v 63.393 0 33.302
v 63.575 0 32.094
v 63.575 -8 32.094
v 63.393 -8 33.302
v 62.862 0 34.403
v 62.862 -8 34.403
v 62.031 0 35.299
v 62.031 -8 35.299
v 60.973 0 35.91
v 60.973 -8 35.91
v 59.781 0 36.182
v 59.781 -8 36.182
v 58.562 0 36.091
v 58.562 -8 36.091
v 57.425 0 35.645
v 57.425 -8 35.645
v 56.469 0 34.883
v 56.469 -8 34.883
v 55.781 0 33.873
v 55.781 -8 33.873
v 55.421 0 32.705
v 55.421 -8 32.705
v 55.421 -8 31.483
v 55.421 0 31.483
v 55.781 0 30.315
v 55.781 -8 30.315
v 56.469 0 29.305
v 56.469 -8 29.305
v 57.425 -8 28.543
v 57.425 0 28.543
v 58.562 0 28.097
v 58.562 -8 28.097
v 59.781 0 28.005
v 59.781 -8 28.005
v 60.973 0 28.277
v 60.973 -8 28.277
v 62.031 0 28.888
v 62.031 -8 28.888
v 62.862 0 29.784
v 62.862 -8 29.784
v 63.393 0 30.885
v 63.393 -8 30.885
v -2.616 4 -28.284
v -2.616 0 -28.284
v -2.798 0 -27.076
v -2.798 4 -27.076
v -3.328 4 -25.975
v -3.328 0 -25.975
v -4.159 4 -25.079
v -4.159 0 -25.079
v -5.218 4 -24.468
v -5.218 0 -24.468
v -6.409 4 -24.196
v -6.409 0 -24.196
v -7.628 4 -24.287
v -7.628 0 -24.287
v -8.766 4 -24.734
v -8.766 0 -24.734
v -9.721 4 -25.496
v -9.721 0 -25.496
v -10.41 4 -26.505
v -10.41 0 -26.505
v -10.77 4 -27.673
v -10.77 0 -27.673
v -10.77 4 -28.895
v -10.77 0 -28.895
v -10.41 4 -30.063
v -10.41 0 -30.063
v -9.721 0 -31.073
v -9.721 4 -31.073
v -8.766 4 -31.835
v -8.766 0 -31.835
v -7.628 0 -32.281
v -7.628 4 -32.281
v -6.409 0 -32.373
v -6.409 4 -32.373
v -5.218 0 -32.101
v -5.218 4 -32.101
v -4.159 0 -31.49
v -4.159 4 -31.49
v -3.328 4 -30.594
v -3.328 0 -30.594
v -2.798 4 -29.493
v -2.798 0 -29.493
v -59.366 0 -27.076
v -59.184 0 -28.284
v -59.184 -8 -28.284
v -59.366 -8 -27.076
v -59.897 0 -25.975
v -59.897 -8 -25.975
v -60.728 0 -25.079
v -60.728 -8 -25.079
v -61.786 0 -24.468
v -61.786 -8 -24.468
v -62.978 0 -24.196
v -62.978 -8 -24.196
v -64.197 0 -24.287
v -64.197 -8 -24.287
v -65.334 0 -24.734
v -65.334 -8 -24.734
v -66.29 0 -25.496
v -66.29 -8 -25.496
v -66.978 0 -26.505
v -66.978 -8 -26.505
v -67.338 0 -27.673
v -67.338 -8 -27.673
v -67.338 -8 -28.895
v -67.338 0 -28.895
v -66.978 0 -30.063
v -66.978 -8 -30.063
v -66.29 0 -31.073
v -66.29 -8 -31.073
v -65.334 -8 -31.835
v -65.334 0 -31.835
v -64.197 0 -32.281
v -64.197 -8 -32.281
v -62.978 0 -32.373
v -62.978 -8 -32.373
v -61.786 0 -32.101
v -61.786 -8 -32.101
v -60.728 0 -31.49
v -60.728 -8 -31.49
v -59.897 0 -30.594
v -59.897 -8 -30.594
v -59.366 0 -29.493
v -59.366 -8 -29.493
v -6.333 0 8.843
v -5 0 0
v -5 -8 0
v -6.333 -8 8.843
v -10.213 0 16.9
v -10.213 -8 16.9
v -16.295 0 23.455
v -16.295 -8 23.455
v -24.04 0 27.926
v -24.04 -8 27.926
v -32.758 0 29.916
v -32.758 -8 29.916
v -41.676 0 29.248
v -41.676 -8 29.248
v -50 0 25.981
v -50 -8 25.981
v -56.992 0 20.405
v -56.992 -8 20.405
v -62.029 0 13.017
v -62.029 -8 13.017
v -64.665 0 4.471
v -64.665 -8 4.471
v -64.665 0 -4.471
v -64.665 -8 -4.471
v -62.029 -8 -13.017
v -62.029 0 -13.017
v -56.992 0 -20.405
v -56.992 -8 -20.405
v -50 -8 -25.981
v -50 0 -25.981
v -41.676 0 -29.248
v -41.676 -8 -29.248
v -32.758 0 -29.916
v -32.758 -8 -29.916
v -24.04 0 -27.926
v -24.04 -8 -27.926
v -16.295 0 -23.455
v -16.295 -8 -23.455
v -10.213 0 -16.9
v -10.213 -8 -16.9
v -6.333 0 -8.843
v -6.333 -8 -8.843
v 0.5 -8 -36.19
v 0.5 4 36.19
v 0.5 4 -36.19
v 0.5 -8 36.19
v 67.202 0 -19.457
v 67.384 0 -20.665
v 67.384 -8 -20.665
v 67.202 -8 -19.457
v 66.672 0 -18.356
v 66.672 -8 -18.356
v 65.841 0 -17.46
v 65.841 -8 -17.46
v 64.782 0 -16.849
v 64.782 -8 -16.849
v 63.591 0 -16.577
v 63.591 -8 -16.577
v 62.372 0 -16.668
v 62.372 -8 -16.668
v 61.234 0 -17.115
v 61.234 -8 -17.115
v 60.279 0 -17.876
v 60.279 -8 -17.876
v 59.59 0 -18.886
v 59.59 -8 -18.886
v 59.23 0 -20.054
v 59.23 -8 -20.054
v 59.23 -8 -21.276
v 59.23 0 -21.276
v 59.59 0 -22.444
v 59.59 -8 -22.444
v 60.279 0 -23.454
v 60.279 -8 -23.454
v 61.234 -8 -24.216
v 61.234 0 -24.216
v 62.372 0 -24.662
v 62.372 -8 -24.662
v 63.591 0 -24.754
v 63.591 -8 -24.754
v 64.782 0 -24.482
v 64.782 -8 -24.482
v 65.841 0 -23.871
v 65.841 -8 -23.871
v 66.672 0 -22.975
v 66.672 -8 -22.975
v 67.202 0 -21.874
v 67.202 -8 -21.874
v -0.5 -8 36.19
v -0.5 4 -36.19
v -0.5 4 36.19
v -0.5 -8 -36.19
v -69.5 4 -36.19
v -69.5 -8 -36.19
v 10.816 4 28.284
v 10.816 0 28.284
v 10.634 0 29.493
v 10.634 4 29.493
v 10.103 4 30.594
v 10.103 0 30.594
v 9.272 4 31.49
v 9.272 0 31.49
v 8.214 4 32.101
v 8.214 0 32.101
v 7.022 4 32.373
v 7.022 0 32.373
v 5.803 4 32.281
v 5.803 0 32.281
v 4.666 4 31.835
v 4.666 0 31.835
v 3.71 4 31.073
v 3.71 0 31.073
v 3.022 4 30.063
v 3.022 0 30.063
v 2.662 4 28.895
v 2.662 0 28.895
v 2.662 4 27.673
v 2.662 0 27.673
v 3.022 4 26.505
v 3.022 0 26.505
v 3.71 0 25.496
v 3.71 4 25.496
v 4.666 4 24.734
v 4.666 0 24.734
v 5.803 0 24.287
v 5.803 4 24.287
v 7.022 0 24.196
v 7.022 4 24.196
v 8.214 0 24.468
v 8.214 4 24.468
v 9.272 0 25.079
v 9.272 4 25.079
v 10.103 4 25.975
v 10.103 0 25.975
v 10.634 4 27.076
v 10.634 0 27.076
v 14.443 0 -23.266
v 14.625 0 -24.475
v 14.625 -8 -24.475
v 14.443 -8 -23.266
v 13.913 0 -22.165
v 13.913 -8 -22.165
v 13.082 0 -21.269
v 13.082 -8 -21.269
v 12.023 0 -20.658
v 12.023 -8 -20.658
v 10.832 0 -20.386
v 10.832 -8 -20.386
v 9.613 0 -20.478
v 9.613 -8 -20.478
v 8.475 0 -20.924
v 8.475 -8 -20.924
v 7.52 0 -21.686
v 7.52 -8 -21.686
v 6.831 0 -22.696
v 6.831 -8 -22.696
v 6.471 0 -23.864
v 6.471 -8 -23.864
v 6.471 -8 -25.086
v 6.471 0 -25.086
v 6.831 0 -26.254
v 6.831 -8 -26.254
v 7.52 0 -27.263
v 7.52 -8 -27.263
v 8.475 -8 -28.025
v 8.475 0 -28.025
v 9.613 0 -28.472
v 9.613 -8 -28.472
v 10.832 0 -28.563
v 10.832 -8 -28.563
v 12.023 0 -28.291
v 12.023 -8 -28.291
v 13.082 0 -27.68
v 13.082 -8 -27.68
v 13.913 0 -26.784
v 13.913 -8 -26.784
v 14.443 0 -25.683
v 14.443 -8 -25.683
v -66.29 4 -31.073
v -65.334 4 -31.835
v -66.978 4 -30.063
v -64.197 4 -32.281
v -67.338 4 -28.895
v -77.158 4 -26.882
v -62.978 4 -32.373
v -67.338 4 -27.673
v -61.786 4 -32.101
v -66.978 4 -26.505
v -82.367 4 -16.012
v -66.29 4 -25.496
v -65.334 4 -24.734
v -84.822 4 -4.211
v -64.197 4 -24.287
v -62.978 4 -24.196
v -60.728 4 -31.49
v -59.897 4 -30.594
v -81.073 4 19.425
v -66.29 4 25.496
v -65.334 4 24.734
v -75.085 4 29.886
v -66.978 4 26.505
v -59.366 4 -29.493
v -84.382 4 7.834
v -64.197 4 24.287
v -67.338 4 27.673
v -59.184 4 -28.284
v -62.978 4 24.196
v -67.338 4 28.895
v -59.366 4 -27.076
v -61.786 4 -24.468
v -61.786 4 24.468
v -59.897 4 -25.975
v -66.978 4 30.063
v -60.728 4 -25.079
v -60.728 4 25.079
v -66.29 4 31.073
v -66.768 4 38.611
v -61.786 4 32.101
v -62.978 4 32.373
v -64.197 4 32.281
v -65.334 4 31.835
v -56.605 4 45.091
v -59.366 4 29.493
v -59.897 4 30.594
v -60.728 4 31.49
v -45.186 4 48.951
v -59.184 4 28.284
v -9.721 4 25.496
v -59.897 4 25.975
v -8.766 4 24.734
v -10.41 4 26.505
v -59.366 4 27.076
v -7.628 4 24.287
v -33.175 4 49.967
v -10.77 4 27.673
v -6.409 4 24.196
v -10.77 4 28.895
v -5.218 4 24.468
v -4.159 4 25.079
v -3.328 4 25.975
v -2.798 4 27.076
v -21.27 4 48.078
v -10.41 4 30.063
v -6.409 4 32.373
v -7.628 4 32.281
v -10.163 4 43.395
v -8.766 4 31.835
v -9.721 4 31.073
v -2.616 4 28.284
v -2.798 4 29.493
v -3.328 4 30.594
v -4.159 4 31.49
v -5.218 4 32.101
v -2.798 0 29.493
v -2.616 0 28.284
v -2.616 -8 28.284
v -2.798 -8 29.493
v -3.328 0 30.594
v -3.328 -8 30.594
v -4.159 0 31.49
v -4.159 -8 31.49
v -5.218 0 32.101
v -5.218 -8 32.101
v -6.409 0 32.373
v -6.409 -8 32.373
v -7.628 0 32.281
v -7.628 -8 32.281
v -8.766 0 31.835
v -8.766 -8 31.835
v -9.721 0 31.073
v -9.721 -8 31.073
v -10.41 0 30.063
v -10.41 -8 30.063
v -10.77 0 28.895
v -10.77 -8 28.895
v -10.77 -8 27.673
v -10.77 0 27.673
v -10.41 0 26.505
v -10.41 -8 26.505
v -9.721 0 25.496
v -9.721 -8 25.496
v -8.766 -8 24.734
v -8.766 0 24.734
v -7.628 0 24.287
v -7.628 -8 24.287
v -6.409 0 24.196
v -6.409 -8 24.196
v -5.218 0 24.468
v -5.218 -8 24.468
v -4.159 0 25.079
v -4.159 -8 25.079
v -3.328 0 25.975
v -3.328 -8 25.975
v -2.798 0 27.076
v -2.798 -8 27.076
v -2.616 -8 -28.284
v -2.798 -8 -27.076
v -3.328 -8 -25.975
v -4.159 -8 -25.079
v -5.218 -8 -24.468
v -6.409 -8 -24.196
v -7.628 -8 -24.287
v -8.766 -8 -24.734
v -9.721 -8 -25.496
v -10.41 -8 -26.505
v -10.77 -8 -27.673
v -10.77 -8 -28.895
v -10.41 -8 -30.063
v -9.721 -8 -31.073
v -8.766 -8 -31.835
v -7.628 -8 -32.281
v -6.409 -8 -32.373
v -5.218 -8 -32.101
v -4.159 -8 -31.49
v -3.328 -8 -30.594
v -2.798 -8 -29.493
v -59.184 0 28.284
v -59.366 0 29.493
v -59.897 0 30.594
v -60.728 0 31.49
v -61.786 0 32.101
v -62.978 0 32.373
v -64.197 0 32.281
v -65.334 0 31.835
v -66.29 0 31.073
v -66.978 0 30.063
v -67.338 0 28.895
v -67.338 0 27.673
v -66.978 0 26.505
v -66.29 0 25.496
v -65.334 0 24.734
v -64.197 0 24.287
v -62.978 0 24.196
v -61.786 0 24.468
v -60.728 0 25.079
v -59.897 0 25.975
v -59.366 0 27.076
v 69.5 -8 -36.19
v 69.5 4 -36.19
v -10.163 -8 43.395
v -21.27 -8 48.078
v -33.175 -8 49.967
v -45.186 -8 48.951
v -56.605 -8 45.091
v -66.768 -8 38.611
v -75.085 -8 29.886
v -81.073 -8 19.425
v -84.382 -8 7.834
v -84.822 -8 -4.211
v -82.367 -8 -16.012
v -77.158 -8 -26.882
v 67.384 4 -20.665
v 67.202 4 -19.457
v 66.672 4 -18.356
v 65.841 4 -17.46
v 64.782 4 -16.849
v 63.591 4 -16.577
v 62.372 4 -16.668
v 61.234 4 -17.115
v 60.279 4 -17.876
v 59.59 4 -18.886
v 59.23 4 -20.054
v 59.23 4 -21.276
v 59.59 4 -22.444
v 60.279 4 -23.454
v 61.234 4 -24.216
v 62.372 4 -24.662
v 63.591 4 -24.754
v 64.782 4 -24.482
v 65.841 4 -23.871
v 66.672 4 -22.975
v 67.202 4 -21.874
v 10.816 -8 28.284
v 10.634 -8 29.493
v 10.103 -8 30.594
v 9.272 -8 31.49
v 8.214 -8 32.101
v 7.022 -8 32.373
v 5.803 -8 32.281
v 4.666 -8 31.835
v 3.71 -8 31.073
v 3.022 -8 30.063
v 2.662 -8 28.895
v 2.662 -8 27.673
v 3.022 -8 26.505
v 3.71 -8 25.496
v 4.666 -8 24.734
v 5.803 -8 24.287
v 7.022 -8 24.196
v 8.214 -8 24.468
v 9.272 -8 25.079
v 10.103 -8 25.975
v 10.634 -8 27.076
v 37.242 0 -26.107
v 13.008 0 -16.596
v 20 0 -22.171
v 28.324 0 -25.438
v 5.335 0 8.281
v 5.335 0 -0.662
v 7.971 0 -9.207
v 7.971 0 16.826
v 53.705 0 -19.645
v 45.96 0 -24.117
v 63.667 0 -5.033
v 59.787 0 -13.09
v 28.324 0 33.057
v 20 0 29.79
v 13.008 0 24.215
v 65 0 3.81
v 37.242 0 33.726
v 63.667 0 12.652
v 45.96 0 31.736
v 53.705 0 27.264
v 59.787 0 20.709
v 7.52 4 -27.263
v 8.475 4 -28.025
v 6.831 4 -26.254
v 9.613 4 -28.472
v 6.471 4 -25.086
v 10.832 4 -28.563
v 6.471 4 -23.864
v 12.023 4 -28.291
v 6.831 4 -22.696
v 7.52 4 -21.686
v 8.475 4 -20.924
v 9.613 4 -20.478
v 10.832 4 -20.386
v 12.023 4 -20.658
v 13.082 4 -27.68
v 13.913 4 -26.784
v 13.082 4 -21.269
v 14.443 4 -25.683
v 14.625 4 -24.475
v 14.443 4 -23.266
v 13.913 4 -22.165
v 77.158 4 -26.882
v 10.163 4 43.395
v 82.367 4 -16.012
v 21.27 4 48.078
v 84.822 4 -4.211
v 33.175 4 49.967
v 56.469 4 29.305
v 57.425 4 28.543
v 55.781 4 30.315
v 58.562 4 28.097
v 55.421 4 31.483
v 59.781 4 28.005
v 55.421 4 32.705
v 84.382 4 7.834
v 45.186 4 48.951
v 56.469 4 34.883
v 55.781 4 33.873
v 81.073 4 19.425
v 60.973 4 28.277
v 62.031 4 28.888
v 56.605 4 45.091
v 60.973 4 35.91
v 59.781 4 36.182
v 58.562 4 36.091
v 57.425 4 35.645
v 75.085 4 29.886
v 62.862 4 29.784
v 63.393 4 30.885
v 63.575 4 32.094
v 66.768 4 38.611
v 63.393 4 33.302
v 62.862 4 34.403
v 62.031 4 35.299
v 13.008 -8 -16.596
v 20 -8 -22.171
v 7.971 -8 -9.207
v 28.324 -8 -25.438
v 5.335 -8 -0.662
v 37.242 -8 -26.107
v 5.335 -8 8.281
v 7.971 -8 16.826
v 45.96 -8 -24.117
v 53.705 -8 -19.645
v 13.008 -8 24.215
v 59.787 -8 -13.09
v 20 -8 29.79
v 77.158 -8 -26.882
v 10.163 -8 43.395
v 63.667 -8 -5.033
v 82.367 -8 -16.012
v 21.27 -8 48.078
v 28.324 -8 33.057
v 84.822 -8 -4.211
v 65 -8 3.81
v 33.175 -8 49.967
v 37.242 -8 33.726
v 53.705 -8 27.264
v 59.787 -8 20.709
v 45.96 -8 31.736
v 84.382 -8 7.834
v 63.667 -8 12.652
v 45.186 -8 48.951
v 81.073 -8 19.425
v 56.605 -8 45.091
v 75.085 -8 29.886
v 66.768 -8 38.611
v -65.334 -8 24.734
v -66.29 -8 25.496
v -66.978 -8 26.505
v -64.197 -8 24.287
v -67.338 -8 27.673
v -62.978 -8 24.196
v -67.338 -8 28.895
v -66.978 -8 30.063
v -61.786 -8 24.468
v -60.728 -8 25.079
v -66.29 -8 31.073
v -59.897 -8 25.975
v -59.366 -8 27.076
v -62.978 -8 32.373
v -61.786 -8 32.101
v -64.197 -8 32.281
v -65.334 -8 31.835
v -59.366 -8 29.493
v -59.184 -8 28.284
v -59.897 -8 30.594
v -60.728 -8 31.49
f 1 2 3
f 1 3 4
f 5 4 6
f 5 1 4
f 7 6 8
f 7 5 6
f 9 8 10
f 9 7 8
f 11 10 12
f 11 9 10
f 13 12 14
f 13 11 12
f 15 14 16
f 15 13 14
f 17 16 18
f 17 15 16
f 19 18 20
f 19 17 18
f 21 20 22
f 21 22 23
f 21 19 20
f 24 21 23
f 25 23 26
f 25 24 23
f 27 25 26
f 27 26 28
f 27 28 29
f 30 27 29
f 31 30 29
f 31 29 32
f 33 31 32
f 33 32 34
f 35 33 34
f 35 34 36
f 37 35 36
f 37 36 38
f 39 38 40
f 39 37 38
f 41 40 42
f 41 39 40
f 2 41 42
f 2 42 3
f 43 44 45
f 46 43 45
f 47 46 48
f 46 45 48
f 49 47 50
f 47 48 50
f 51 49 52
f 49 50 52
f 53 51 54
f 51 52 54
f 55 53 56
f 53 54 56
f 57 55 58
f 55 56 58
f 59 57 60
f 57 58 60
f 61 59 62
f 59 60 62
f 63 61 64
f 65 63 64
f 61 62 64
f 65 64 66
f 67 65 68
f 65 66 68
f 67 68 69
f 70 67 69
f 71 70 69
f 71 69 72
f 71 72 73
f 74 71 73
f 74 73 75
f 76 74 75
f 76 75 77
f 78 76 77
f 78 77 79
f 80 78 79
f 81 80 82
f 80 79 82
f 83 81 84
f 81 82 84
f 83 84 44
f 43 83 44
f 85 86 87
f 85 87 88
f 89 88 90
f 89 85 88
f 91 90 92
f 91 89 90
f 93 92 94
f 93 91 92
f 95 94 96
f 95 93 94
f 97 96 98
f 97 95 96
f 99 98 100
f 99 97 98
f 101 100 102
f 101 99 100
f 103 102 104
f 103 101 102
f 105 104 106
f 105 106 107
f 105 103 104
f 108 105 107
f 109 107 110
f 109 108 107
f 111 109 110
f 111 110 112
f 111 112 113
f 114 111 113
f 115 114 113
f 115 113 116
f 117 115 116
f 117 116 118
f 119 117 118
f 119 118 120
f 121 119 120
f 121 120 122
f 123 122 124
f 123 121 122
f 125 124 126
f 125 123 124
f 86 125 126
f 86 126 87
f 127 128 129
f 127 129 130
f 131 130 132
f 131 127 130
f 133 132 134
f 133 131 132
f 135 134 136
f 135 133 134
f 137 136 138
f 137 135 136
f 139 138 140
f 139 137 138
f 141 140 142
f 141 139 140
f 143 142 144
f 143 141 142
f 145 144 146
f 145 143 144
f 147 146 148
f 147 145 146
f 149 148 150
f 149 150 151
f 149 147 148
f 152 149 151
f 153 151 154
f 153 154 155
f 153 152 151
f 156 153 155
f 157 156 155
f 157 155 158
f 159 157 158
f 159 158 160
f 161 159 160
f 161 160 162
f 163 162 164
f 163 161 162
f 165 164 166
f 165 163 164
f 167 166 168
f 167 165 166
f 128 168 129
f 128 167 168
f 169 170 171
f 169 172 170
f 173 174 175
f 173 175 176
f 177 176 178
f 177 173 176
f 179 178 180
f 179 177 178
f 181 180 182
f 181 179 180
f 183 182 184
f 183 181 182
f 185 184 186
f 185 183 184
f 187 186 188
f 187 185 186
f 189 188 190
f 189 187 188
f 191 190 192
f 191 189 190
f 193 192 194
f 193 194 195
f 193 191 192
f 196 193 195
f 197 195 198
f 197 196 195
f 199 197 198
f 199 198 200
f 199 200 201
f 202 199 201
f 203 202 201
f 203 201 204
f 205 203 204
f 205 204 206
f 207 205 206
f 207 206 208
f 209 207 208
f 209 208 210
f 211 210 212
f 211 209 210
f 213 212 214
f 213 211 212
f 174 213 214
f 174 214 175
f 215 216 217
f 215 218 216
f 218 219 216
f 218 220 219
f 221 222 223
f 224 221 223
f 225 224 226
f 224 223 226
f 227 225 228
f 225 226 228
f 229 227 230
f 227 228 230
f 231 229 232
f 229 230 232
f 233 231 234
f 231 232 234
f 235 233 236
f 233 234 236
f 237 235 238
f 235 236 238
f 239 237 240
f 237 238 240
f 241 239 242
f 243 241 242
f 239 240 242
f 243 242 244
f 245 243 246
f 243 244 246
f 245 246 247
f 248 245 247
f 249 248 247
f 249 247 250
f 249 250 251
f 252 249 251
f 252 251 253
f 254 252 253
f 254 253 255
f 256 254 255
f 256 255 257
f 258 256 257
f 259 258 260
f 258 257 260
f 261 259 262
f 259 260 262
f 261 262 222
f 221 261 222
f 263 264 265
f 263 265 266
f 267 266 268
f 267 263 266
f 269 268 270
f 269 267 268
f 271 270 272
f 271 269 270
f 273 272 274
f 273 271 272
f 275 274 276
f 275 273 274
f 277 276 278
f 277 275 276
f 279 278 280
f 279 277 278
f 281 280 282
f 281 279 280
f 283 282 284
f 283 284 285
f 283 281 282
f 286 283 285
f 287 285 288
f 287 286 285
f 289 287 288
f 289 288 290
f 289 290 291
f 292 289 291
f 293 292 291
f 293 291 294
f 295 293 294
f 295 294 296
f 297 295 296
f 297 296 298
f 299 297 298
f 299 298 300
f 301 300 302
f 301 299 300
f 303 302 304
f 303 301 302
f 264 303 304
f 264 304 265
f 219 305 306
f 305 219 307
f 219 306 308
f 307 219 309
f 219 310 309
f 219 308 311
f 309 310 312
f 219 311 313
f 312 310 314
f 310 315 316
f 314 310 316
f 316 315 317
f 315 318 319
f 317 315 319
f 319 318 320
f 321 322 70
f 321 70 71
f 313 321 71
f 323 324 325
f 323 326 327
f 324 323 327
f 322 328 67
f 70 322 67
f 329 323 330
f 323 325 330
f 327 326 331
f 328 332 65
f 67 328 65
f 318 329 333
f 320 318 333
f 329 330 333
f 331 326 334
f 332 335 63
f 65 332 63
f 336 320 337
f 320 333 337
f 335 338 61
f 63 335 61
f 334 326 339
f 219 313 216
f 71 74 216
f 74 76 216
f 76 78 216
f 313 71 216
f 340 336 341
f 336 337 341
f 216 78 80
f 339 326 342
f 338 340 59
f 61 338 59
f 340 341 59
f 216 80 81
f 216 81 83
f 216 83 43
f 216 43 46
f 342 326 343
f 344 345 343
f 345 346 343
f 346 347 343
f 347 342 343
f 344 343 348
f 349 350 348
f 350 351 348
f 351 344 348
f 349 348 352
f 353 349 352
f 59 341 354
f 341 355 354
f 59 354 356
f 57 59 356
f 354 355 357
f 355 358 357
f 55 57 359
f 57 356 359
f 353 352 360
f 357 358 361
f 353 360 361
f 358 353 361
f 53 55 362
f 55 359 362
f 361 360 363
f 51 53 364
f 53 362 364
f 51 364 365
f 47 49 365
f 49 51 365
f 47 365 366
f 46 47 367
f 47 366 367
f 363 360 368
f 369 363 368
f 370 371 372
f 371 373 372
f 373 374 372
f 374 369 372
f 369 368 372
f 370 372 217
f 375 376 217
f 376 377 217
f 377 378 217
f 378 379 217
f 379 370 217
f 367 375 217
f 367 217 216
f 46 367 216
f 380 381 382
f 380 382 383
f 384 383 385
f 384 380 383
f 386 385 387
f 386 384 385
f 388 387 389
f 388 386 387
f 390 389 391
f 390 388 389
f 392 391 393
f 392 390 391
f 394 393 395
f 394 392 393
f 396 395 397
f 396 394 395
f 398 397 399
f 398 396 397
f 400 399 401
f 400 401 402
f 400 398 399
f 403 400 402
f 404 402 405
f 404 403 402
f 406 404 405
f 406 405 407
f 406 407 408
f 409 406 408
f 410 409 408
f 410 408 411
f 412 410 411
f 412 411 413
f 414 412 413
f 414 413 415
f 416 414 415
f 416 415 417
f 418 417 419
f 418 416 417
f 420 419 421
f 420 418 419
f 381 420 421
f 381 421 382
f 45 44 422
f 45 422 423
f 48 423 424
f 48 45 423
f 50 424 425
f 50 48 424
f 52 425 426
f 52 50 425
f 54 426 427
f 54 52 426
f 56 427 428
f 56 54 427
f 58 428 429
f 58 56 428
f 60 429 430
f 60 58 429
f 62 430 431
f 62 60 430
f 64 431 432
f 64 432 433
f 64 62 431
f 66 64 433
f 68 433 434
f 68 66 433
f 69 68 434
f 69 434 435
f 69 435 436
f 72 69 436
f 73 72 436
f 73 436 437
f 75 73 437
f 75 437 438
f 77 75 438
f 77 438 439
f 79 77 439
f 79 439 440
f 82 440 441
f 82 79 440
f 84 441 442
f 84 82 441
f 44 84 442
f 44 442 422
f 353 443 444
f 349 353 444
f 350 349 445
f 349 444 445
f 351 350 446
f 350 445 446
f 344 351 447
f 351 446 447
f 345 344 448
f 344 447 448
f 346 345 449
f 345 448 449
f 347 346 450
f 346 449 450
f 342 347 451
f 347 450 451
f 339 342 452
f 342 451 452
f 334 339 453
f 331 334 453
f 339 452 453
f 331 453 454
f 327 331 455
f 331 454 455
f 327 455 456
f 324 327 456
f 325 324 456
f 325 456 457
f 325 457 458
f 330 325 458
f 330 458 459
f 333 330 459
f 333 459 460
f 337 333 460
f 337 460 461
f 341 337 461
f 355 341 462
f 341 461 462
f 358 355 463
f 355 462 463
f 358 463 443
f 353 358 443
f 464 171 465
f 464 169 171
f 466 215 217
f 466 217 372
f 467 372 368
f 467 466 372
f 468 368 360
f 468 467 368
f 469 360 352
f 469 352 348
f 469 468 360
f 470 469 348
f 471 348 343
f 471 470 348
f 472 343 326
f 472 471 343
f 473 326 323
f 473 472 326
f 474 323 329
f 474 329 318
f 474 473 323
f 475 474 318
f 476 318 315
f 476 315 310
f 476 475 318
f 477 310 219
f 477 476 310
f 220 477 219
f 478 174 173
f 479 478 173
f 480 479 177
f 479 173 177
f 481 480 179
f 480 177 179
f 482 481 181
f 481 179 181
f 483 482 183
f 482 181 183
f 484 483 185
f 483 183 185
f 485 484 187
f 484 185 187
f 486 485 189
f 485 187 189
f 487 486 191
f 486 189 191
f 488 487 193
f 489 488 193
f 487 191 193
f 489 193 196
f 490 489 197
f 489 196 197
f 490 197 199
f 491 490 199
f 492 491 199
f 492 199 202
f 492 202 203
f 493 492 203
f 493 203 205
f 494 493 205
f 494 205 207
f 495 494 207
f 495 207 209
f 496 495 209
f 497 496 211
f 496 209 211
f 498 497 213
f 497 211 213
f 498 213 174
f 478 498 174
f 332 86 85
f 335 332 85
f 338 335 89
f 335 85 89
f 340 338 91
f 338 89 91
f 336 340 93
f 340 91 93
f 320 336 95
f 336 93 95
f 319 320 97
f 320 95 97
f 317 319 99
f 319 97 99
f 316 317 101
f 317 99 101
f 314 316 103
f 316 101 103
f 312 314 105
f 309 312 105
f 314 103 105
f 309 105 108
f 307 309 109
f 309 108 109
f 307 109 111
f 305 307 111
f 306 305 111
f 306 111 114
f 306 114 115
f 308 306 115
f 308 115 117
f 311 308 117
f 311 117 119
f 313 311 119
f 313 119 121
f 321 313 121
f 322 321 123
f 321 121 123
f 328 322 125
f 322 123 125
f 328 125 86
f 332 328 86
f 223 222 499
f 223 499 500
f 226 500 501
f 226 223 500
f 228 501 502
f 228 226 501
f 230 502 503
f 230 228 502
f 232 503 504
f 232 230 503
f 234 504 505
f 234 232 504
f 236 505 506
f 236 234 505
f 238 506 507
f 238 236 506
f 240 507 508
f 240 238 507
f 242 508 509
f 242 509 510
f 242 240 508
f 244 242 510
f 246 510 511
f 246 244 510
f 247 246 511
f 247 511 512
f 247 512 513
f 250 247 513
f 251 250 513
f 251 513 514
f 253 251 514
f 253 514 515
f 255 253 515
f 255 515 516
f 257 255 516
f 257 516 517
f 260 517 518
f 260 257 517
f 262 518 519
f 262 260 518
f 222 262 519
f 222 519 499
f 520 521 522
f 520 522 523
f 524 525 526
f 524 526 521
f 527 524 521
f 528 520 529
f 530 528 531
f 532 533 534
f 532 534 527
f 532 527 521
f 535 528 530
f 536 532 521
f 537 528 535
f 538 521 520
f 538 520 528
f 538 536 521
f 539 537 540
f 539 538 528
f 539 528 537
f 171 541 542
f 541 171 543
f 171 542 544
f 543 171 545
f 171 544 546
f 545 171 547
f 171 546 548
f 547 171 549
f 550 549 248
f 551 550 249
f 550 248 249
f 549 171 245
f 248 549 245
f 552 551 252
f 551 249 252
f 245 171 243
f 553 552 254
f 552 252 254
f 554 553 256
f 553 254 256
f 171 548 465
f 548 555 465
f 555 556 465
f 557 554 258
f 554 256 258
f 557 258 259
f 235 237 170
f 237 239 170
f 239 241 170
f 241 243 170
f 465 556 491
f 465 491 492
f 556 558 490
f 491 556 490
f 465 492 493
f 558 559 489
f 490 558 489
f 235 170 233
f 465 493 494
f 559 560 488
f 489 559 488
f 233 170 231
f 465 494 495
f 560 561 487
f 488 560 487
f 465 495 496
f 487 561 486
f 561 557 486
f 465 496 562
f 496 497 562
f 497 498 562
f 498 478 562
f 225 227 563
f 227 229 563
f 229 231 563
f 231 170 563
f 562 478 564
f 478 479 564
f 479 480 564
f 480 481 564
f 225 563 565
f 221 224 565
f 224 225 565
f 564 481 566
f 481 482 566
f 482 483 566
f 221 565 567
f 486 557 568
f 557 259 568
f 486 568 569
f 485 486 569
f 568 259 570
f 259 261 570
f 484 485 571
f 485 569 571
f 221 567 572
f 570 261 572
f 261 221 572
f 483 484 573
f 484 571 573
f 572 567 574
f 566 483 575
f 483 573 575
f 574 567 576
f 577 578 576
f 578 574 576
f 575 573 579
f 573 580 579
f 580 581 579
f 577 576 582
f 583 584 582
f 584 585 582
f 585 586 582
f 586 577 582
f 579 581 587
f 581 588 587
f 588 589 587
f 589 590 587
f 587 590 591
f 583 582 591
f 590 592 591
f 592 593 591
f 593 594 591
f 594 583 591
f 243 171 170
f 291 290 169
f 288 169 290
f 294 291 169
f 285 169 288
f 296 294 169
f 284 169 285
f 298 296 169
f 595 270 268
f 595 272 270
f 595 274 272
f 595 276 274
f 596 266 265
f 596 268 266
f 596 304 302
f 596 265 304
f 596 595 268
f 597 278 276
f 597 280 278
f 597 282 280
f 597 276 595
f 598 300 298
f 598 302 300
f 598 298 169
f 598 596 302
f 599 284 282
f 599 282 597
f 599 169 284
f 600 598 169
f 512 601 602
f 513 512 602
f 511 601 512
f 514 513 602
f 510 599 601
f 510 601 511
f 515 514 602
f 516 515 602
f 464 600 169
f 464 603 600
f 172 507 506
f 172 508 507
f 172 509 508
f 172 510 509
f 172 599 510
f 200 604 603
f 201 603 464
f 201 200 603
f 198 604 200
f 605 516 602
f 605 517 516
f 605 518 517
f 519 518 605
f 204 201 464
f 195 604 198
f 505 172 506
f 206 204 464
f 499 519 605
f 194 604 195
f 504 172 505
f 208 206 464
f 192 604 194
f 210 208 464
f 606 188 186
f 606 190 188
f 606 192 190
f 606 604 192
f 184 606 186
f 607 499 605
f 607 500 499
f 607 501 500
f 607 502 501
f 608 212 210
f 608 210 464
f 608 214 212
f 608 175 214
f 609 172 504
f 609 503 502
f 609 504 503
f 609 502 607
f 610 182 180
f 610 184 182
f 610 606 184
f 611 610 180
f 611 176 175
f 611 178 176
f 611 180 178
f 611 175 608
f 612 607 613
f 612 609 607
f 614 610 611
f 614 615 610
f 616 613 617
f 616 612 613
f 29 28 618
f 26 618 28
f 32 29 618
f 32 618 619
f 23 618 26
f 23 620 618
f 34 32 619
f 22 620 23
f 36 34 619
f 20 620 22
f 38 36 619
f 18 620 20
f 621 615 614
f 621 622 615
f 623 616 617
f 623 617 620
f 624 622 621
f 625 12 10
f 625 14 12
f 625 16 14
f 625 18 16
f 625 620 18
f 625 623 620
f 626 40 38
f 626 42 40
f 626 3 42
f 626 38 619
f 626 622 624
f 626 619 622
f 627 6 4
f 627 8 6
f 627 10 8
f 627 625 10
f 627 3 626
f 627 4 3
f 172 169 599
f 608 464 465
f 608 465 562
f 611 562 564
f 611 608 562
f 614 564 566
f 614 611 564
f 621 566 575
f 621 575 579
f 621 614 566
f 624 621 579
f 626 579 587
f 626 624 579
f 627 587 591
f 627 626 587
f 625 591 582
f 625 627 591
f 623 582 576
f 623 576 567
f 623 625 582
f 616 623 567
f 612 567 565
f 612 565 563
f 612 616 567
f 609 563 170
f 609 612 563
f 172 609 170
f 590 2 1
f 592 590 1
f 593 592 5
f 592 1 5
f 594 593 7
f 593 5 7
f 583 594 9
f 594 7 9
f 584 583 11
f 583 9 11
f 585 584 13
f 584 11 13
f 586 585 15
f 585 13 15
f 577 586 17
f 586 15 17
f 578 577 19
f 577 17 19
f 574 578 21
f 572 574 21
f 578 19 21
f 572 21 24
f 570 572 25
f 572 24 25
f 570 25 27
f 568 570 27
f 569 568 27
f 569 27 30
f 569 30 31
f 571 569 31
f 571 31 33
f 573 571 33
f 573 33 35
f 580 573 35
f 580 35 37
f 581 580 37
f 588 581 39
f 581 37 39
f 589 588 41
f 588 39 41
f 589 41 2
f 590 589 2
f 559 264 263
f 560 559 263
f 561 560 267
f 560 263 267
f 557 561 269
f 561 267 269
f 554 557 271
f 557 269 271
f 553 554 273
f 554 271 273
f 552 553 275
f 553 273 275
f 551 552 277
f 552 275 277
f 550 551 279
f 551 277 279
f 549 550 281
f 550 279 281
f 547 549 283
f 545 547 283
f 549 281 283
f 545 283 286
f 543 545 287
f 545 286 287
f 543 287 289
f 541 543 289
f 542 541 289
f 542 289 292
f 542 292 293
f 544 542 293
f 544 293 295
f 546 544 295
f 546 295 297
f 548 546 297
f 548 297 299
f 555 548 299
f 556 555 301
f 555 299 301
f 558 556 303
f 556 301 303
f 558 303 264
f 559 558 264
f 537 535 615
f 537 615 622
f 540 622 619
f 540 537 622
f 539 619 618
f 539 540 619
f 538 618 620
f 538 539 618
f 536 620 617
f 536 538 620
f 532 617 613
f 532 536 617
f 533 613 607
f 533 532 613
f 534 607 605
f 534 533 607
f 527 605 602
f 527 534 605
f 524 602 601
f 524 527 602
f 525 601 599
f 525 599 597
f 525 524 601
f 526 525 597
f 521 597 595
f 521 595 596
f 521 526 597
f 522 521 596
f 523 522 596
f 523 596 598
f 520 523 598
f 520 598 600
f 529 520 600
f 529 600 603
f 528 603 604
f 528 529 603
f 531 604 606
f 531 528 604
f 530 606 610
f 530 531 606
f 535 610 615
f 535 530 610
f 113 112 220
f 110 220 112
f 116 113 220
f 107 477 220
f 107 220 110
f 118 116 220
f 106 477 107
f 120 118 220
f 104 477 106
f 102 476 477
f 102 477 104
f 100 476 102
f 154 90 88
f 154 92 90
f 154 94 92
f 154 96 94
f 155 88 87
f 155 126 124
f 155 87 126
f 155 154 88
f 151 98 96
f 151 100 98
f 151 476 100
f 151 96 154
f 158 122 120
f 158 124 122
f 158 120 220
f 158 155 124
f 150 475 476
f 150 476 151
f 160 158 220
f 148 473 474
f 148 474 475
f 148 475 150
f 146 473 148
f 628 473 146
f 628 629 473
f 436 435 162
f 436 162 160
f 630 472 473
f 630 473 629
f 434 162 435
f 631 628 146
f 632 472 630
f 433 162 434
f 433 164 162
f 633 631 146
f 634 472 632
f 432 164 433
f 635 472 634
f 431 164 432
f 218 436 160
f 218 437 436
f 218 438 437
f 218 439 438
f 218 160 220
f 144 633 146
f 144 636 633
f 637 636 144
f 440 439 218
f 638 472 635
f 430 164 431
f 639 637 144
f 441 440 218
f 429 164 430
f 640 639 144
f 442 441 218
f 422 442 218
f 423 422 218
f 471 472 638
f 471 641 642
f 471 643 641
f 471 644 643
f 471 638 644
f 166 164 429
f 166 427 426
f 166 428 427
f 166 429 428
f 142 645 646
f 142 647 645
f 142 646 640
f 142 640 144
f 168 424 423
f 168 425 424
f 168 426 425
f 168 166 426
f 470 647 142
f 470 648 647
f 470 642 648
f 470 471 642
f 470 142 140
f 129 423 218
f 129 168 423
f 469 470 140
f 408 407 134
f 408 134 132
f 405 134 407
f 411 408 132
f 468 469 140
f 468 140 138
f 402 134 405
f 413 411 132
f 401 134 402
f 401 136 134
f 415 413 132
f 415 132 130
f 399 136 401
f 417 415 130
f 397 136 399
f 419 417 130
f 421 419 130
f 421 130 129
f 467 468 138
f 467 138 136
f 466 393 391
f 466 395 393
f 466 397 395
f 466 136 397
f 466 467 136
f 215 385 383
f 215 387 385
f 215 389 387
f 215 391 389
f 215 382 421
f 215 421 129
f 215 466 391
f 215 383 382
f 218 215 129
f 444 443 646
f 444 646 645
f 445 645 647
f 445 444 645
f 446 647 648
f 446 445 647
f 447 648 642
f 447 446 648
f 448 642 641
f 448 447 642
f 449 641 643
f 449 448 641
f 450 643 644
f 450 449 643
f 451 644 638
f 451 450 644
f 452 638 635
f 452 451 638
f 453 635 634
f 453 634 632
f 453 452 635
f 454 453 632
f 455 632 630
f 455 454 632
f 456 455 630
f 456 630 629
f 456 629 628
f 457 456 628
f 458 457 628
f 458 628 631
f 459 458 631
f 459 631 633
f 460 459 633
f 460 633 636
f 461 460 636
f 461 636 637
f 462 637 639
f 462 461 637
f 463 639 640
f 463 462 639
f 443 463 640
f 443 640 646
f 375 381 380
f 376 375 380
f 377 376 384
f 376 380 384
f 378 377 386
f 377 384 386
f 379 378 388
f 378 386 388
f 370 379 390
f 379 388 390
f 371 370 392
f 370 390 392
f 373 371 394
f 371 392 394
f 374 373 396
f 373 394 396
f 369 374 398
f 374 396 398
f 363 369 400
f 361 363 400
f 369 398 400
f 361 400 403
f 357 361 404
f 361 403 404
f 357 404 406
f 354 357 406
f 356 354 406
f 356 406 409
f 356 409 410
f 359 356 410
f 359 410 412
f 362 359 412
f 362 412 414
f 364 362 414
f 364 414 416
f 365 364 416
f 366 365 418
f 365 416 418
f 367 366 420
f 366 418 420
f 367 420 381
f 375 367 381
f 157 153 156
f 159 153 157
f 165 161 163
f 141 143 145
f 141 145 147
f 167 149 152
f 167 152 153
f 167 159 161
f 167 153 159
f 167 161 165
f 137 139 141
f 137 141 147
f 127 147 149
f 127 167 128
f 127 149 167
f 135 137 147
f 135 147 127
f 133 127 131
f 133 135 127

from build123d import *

# Parameters (mm, degrees)
F0_R     = 4.1
F0_R_2   = 30
F1_DEPTH = 8
F2_DEPTH = 4
F3_DEPTH = 4


with BuildPart() as f1:
    # F0 (on Front) → F1 (new body)
    with BuildSketch(Plane.XZ):
        with BuildLine():
            Line((-0.5, -36.1904683584), (-0.5, 36.1904683584))
            ThreePointArc((-0.5, 36.1904683584), (-71.1904683584, 34.5), (-69.5, -36.1904683584))
            Line((-69.5, -36.1904683584), (-0.5, -36.1904683584))
        make_face()
        with Locations((-63.2842712475, -28.2842712475)):
            Circle(F0_R, mode=Mode.SUBTRACT)
        with Locations((-6.7157287525, -28.2842712475)):
            Circle(F0_R, mode=Mode.SUBTRACT)
        with Locations((-35, 0)):
            Circle(F0_R_2, mode=Mode.SUBTRACT)
        with Locations((-63.2842712475, 28.2842712475)):
            Circle(F0_R, mode=Mode.SUBTRACT)
        with Locations((-6.7157287525, 28.2842712475)):
            Circle(F0_R, mode=Mode.SUBTRACT)
    extrude(amount=F1_DEPTH)

    # F0 (on Front) → F2 (join)
    with BuildSketch(Plane.XZ):
        with BuildLine():
            Line((-0.5, -36.1904683584), (-0.5, 36.1904683584))
            ThreePointArc((-0.5, 36.1904683584), (-71.1904683584, 34.5), (-69.5, -36.1904683584))
            Line((-69.5, -36.1904683584), (-0.5, -36.1904683584))
        make_face()
        with Locations((-63.2842712475, -28.2842712475)):
            Circle(F0_R, mode=Mode.SUBTRACT)
        with Locations((-6.7157287525, -28.2842712475)):
            Circle(F0_R, mode=Mode.SUBTRACT)
        with Locations((-35, 0)):
            Circle(F0_R_2, mode=Mode.SUBTRACT)
        with Locations((-63.2842712475, 28.2842712475)):
            Circle(F0_R, mode=Mode.SUBTRACT)
        with Locations((-6.7157287525, 28.2842712475)):
            Circle(F0_R, mode=Mode.SUBTRACT)
        with Locations((-35, 0)):
            Circle(F0_R_2)
    extrude(amount=-F2_DEPTH)


with BuildPart() as f1b:
    # F0 (on Front) → F1, piece 2 (new body)
    with BuildSketch(Plane.XZ):
        with BuildLine():
            Line((0.5, -36.1904683584), (69.5, -36.1904683584))
            ThreePointArc((69.5, -36.1904683584), (71.1904683584, 34.5), (0.5, 36.1904683584))
            Line((0.5, 36.1904683584), (0.5, -36.1904683584))
        make_face()
        with Locations((10.5252603941, -24.4747396059)):
            Circle(F0_R, mode=Mode.SUBTRACT)
        with Locations((63.2842712475, -20.6652079643)):
            Circle(F0_R, mode=Mode.SUBTRACT)
        with Locations((35, 3.8095316416)):
            Circle(F0_R_2, mode=Mode.SUBTRACT)
        with Locations((6.7157287525, 28.2842712475)):
            Circle(F0_R, mode=Mode.SUBTRACT)
        with Locations((59.4747396059, 32.0938028891)):
            Circle(F0_R, mode=Mode.SUBTRACT)
    extrude(amount=F1_DEPTH)

    # F0 (on Front) → F3 (join)
    with BuildSketch(Plane.XZ):
        with BuildLine():
            Line((0.5, -36.1904683584), (69.5, -36.1904683584))
            ThreePointArc((69.5, -36.1904683584), (71.1904683584, 34.5), (0.5, 36.1904683584))
            Line((0.5, 36.1904683584), (0.5, -36.1904683584))
        make_face()
        with Locations((10.5252603941, -24.4747396059)):
            Circle(F0_R, mode=Mode.SUBTRACT)
        with Locations((63.2842712475, -20.6652079643)):
            Circle(F0_R, mode=Mode.SUBTRACT)
        with Locations((35, 3.8095316416)):
            Circle(F0_R_2, mode=Mode.SUBTRACT)
        with Locations((6.7157287525, 28.2842712475)):
            Circle(F0_R, mode=Mode.SUBTRACT)
        with Locations((59.4747396059, 32.0938028891)):
            Circle(F0_R, mode=Mode.SUBTRACT)
        with Locations((35, 3.8095316416)):
            Circle(F0_R_2)
    extrude(amount=-F3_DEPTH)


solid = Compound([f1.part, f1b.part])
